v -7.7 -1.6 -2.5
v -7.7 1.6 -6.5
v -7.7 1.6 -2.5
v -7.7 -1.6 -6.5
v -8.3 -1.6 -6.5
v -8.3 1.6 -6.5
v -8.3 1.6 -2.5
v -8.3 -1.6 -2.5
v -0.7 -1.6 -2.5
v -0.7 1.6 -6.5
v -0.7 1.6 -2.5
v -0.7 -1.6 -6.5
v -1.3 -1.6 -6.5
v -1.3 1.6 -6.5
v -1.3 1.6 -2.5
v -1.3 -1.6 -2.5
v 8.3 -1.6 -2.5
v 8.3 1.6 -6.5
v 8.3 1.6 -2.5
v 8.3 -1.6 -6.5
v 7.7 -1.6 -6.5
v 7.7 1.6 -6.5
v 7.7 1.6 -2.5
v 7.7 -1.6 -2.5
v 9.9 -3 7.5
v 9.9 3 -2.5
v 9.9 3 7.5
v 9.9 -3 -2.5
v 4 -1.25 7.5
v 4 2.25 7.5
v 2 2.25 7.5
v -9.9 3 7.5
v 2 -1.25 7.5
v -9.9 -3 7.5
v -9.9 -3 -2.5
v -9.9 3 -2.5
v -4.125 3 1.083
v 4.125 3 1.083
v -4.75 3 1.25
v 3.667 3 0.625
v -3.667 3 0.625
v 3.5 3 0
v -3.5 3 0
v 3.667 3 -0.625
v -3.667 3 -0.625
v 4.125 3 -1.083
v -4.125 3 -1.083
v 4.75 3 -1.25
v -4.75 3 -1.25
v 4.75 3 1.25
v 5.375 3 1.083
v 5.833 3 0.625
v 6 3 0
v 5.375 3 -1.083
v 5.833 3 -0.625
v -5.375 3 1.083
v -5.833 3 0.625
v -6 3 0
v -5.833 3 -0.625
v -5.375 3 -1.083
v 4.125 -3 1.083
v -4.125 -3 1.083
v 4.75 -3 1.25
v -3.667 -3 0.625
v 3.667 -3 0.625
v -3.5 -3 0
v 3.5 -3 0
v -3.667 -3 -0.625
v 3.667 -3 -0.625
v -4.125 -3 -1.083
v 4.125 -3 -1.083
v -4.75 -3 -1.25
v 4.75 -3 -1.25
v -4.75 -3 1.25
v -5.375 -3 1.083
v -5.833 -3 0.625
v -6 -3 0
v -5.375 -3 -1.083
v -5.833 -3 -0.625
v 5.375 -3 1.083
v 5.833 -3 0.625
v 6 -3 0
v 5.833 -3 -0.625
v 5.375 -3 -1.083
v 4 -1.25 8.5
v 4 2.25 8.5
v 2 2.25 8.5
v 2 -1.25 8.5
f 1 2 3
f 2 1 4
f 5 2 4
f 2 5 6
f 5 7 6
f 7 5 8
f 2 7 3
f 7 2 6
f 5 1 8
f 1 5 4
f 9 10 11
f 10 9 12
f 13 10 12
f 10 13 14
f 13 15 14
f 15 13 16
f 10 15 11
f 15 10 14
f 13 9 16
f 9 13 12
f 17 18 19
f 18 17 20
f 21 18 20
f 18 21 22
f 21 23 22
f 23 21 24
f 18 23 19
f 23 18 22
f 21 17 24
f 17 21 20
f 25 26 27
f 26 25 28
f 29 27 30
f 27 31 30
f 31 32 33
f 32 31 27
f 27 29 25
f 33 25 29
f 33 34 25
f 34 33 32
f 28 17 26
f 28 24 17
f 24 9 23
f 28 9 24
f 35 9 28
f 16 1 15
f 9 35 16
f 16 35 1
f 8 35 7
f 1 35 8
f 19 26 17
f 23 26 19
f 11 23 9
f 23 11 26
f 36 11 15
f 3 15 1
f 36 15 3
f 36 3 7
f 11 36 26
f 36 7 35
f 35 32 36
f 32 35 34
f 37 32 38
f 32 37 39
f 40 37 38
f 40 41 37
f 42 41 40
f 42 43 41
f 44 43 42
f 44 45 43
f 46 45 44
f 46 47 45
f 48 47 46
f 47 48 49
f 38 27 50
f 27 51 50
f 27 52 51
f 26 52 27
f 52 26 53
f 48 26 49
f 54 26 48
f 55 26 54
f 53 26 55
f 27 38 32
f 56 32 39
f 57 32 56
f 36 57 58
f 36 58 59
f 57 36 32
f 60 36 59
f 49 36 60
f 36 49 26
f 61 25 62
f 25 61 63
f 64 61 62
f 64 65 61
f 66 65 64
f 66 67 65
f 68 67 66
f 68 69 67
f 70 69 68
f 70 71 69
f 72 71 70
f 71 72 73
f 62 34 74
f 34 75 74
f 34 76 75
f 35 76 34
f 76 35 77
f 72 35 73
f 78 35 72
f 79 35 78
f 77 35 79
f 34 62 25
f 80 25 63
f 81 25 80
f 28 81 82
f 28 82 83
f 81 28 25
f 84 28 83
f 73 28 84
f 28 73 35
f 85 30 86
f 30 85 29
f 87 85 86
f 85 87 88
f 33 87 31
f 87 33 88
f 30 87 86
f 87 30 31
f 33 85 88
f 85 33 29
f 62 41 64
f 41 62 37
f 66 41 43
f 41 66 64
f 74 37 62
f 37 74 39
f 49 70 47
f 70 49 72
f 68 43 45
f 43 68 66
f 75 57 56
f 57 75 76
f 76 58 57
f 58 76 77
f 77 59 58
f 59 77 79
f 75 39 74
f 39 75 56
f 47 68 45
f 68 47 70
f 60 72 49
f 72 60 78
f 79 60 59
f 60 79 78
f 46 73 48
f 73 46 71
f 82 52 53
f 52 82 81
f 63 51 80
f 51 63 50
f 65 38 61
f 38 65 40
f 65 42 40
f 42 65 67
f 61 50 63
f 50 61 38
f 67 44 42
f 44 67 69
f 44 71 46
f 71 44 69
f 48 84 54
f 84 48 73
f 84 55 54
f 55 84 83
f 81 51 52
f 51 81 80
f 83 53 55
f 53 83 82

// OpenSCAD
// Don't print this file, purchase real micro switches
// e.g. Honeywell ZM10B10A01 or OMRON SS-5 or similar.

module microswitch() {
  difference() {
    union() {
      translate([0, 0, 2.5])
        cube([19.8, 6, 10], center=true);
      translate([3, 0.5, 6])
        cube([2, 3.5, 5], center=true);
      for (x = [-8, -1, 8]) {
        translate([x, 0, 0])
          cube([0.6, 3.2, 13], center=true);
      }
    }
    for (x = [-9.5/2, 9.5/2]) {
      translate([x, 0, 0]) rotate([90, 0, 0])
        cylinder(r=2.5/2, h=20, center=true, $fn=12);
    }
  }
}

microswitch();
